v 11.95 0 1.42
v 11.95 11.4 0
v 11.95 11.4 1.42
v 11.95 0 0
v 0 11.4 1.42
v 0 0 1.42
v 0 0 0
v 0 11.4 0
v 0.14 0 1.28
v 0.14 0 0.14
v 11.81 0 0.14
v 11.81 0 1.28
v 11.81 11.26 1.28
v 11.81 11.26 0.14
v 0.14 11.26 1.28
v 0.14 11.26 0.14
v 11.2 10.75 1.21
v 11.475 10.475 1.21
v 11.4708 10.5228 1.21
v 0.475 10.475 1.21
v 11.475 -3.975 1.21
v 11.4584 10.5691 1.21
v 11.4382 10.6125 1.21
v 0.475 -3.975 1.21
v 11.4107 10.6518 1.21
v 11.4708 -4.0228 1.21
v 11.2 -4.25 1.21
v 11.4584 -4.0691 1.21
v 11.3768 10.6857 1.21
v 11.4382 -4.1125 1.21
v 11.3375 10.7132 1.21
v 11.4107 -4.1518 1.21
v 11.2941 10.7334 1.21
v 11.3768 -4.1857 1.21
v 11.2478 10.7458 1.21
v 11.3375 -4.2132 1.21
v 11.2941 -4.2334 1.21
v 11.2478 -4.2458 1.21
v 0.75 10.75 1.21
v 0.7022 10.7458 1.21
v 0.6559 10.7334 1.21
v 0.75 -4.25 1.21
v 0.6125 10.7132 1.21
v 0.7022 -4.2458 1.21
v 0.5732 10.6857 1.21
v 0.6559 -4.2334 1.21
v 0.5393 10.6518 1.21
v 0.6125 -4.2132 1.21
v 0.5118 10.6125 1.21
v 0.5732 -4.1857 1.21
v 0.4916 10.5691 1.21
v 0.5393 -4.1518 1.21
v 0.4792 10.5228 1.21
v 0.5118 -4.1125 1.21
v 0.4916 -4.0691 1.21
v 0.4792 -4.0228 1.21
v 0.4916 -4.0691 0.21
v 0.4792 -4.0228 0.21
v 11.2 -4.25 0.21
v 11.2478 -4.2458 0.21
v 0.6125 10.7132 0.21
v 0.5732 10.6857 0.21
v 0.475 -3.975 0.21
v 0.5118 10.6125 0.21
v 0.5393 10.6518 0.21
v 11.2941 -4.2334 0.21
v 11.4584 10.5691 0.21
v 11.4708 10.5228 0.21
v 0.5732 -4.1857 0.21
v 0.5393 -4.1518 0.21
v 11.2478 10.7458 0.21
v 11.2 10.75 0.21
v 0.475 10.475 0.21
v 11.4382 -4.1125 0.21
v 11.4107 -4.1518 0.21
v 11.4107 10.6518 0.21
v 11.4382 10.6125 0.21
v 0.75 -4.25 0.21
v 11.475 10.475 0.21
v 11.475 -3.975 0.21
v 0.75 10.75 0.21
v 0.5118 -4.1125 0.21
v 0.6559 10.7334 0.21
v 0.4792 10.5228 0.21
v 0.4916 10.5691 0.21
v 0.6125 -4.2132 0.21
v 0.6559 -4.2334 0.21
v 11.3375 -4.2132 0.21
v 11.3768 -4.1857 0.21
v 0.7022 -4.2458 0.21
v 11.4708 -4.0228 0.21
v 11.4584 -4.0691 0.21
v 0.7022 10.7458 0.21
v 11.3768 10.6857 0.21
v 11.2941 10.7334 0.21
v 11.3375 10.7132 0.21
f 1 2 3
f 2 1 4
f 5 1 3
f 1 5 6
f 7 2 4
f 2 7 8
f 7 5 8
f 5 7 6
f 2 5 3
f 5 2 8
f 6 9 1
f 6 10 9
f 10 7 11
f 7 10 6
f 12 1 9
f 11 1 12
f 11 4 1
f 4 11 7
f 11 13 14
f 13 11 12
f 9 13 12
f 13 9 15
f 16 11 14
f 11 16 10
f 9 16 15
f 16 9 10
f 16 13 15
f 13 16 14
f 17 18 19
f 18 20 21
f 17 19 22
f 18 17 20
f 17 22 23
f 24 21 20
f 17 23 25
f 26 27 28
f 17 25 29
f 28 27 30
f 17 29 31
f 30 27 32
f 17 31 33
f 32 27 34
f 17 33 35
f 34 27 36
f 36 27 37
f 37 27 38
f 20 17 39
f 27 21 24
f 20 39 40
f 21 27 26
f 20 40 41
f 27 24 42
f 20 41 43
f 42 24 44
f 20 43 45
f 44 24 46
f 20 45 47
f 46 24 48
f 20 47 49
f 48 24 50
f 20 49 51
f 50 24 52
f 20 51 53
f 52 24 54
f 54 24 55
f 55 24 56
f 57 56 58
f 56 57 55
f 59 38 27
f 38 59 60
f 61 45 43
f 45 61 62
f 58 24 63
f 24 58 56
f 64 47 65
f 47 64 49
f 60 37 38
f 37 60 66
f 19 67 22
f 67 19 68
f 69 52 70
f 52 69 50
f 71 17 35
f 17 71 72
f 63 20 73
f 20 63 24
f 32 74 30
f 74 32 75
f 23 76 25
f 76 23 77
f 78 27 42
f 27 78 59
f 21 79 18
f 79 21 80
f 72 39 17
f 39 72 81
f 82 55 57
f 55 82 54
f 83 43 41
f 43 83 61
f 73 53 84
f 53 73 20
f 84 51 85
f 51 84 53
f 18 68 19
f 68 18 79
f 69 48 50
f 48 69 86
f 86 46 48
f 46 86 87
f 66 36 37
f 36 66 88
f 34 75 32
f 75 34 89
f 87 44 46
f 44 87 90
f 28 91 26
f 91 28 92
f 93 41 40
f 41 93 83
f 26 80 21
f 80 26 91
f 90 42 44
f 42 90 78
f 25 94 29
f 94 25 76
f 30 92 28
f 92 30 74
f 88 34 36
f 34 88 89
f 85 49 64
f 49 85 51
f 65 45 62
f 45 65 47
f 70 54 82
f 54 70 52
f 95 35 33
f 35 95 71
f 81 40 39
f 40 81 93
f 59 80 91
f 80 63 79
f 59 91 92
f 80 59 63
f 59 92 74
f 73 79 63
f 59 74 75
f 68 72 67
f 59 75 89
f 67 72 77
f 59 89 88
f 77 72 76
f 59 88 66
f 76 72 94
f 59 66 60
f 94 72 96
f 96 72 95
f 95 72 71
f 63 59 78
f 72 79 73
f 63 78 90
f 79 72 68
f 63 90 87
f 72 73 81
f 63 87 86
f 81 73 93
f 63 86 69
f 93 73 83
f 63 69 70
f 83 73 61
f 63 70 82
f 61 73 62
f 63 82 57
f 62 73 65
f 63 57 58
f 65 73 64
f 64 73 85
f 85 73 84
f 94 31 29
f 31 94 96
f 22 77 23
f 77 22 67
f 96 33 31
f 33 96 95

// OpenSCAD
/**
  * Module: MicroSD card and socket placeholders.
  *
  * Author: Karim Aziiev <karim.aziiev@gmail.com>
  * License: GPL-3.0-or-later
  */
include <../colors.scad>
include <../parameters.scad>

use <../lib/plist.scad>
use <../lib/shapes3d.scad>
use <../lib/transforms.scad>

/**
  ─────────────────────────────────────────────────────────────────────────────
  micro_sd_card
  ─────────────────────────────────────────────────────────────────────────────
  Render a microSD card with its contact end facing +Y.

  **Parameters:**
  - `size`: Card `[width, length, thickness]`, default `[11, 15, 1]` mm.
  - `anchor`: Placement against the complete card reference box.
  - `show_contacts`: Show eight contacts inset into the +Z face.

  The reference envelope follows the SD Association's microSD form factor:
  https://www.sdcard.org/developers/sd-standard-overview/capacity-sd-sdhc-sdxc-sduc/
  Corner and contact details are simplified within that envelope.
 */
module micro_sd_card(size=[11, 15, 1],
                     anchor=[1, 1, 1],
                     show_contacts=true) {
  assert(len(size) == 3 && min(size) > 0, "Card size must be positive XYZ");
  with_anchor(size=size, anchor=anchor) {
    color(matte_black) {
      cuboid(size=size,
             r=min(size[0], size[1]) * 0.025,
             anchor=[1, 1, 1]);
    }
    if (show_contacts) {
      for (i = [0:7]) {
        translate([size[0] * (0.08 + i * 0.105),
                   size[1] * 0.73,
                   size[2] - 0.01]) {
          color(metallic_yellow_1) {
            cube([size[0] * 0.075, size[1] * 0.23, 0.01]);
          }
        }
      }
    }
  }
}

/**
  ─────────────────────────────────────────────────────────────────────────────
  micro_sd_card_from_plist
  ─────────────────────────────────────────────────────────────────────────────
  Render a card from its reusable properties.

  **Parameters:**
  - `plist`: Optional `size`, `anchor` and `show_contacts` card properties.
  - `anchor`: Placement override; `undef` uses the plist or `[1, 1, 1]`.
 */
module micro_sd_card_from_plist(plist=micro_sd_card_plist, anchor) {
  assert(plist_is(plist) && len(plist) > 0, "Supply a hardware specification");
  micro_sd_card(size=plist_get("size", plist, [11, 15, 1]),
                anchor=is_undef(anchor)
                       ? plist_get("anchor", plist, [1, 1, 1])
                       : anchor,
                show_contacts=plist_get("show_contacts", plist, true));
}

/**
  ─────────────────────────────────────────────────────────────────────────────
  micro_sd_card_position
  ─────────────────────────────────────────────────────────────────────────────
  Return the inserted card's minimum XYZ relative to its socket.

  **Parameters:**
  - `size`: Socket `[width, depth, height]`, with its opening at Y=0.
  - `card_size`: Card `[width, length, thickness]`.
  - `insertion`: Distance from the socket mouth to the card's +Y tip.

  **Returns:** `[x, y, z]`, centered across the socket opening on X and Z.
 */
function micro_sd_card_position(size, card_size, insertion) =
  assert(min(card_size) > 0 && size[0] > card_size[0]
         && size[2] > card_size[2],
         "Card must fit inside its socket")
  assert(insertion > 0 && insertion <= min(size[1], card_size[1]),
         "Card insertion must fit inside the socket and card length")
  [(size[0] - card_size[0]) / 2,
   insertion - card_size[1],
   (size[2] - card_size[2]) / 2];

/**
  ─────────────────────────────────────────────────────────────────────────────
  micro_sd_socket
  ─────────────────────────────────────────────────────────────────────────────
  Render a socket opening toward -Y, with an optional inserted card.

  **Parameters:**
  - `size`: Socket body `[width, depth, height]`.
  - `card`: Card plist accepted by `micro_sd_card_from_plist`.
  - `insertion`: Distance from the socket mouth to the card's contact tip.
  - `show_card`: Display the inserted card when true.
  - `anchor`: Placement against the socket body, excluding card overhang.
 */
module micro_sd_socket(size=[11.95, 11.4, 1.42],
                       card=micro_sd_card_plist,
                       insertion=10.75,
                       show_card=true,
                       anchor=[1, 1, 1]) {
  assert(plist_is(card) && len(card) > 0, "Supply a hardware specification");
  card_size = plist_get("size", card, [11, 15, 1]);
  card_pos = micro_sd_card_position(size, card_size, insertion);
  wall = min((size[0] - card_size[0]) / 3,
             (size[2] - card_size[2]) / 3);
  with_anchor(size=size, anchor=anchor) {
    color(metallic_silver_1) {
      difference() {
        cube(size);
        translate([wall, -0.01, wall]) {
          cube([size[0] - 2 * wall, size[1] - wall + 0.01,
                size[2] - 2 * wall]);
        }
      }
    }
    if (show_card) {
      translate(card_pos) {
        micro_sd_card_from_plist(card, anchor=[1, 1, 1]);
      }
    }
  }
}

micro_sd_socket();
